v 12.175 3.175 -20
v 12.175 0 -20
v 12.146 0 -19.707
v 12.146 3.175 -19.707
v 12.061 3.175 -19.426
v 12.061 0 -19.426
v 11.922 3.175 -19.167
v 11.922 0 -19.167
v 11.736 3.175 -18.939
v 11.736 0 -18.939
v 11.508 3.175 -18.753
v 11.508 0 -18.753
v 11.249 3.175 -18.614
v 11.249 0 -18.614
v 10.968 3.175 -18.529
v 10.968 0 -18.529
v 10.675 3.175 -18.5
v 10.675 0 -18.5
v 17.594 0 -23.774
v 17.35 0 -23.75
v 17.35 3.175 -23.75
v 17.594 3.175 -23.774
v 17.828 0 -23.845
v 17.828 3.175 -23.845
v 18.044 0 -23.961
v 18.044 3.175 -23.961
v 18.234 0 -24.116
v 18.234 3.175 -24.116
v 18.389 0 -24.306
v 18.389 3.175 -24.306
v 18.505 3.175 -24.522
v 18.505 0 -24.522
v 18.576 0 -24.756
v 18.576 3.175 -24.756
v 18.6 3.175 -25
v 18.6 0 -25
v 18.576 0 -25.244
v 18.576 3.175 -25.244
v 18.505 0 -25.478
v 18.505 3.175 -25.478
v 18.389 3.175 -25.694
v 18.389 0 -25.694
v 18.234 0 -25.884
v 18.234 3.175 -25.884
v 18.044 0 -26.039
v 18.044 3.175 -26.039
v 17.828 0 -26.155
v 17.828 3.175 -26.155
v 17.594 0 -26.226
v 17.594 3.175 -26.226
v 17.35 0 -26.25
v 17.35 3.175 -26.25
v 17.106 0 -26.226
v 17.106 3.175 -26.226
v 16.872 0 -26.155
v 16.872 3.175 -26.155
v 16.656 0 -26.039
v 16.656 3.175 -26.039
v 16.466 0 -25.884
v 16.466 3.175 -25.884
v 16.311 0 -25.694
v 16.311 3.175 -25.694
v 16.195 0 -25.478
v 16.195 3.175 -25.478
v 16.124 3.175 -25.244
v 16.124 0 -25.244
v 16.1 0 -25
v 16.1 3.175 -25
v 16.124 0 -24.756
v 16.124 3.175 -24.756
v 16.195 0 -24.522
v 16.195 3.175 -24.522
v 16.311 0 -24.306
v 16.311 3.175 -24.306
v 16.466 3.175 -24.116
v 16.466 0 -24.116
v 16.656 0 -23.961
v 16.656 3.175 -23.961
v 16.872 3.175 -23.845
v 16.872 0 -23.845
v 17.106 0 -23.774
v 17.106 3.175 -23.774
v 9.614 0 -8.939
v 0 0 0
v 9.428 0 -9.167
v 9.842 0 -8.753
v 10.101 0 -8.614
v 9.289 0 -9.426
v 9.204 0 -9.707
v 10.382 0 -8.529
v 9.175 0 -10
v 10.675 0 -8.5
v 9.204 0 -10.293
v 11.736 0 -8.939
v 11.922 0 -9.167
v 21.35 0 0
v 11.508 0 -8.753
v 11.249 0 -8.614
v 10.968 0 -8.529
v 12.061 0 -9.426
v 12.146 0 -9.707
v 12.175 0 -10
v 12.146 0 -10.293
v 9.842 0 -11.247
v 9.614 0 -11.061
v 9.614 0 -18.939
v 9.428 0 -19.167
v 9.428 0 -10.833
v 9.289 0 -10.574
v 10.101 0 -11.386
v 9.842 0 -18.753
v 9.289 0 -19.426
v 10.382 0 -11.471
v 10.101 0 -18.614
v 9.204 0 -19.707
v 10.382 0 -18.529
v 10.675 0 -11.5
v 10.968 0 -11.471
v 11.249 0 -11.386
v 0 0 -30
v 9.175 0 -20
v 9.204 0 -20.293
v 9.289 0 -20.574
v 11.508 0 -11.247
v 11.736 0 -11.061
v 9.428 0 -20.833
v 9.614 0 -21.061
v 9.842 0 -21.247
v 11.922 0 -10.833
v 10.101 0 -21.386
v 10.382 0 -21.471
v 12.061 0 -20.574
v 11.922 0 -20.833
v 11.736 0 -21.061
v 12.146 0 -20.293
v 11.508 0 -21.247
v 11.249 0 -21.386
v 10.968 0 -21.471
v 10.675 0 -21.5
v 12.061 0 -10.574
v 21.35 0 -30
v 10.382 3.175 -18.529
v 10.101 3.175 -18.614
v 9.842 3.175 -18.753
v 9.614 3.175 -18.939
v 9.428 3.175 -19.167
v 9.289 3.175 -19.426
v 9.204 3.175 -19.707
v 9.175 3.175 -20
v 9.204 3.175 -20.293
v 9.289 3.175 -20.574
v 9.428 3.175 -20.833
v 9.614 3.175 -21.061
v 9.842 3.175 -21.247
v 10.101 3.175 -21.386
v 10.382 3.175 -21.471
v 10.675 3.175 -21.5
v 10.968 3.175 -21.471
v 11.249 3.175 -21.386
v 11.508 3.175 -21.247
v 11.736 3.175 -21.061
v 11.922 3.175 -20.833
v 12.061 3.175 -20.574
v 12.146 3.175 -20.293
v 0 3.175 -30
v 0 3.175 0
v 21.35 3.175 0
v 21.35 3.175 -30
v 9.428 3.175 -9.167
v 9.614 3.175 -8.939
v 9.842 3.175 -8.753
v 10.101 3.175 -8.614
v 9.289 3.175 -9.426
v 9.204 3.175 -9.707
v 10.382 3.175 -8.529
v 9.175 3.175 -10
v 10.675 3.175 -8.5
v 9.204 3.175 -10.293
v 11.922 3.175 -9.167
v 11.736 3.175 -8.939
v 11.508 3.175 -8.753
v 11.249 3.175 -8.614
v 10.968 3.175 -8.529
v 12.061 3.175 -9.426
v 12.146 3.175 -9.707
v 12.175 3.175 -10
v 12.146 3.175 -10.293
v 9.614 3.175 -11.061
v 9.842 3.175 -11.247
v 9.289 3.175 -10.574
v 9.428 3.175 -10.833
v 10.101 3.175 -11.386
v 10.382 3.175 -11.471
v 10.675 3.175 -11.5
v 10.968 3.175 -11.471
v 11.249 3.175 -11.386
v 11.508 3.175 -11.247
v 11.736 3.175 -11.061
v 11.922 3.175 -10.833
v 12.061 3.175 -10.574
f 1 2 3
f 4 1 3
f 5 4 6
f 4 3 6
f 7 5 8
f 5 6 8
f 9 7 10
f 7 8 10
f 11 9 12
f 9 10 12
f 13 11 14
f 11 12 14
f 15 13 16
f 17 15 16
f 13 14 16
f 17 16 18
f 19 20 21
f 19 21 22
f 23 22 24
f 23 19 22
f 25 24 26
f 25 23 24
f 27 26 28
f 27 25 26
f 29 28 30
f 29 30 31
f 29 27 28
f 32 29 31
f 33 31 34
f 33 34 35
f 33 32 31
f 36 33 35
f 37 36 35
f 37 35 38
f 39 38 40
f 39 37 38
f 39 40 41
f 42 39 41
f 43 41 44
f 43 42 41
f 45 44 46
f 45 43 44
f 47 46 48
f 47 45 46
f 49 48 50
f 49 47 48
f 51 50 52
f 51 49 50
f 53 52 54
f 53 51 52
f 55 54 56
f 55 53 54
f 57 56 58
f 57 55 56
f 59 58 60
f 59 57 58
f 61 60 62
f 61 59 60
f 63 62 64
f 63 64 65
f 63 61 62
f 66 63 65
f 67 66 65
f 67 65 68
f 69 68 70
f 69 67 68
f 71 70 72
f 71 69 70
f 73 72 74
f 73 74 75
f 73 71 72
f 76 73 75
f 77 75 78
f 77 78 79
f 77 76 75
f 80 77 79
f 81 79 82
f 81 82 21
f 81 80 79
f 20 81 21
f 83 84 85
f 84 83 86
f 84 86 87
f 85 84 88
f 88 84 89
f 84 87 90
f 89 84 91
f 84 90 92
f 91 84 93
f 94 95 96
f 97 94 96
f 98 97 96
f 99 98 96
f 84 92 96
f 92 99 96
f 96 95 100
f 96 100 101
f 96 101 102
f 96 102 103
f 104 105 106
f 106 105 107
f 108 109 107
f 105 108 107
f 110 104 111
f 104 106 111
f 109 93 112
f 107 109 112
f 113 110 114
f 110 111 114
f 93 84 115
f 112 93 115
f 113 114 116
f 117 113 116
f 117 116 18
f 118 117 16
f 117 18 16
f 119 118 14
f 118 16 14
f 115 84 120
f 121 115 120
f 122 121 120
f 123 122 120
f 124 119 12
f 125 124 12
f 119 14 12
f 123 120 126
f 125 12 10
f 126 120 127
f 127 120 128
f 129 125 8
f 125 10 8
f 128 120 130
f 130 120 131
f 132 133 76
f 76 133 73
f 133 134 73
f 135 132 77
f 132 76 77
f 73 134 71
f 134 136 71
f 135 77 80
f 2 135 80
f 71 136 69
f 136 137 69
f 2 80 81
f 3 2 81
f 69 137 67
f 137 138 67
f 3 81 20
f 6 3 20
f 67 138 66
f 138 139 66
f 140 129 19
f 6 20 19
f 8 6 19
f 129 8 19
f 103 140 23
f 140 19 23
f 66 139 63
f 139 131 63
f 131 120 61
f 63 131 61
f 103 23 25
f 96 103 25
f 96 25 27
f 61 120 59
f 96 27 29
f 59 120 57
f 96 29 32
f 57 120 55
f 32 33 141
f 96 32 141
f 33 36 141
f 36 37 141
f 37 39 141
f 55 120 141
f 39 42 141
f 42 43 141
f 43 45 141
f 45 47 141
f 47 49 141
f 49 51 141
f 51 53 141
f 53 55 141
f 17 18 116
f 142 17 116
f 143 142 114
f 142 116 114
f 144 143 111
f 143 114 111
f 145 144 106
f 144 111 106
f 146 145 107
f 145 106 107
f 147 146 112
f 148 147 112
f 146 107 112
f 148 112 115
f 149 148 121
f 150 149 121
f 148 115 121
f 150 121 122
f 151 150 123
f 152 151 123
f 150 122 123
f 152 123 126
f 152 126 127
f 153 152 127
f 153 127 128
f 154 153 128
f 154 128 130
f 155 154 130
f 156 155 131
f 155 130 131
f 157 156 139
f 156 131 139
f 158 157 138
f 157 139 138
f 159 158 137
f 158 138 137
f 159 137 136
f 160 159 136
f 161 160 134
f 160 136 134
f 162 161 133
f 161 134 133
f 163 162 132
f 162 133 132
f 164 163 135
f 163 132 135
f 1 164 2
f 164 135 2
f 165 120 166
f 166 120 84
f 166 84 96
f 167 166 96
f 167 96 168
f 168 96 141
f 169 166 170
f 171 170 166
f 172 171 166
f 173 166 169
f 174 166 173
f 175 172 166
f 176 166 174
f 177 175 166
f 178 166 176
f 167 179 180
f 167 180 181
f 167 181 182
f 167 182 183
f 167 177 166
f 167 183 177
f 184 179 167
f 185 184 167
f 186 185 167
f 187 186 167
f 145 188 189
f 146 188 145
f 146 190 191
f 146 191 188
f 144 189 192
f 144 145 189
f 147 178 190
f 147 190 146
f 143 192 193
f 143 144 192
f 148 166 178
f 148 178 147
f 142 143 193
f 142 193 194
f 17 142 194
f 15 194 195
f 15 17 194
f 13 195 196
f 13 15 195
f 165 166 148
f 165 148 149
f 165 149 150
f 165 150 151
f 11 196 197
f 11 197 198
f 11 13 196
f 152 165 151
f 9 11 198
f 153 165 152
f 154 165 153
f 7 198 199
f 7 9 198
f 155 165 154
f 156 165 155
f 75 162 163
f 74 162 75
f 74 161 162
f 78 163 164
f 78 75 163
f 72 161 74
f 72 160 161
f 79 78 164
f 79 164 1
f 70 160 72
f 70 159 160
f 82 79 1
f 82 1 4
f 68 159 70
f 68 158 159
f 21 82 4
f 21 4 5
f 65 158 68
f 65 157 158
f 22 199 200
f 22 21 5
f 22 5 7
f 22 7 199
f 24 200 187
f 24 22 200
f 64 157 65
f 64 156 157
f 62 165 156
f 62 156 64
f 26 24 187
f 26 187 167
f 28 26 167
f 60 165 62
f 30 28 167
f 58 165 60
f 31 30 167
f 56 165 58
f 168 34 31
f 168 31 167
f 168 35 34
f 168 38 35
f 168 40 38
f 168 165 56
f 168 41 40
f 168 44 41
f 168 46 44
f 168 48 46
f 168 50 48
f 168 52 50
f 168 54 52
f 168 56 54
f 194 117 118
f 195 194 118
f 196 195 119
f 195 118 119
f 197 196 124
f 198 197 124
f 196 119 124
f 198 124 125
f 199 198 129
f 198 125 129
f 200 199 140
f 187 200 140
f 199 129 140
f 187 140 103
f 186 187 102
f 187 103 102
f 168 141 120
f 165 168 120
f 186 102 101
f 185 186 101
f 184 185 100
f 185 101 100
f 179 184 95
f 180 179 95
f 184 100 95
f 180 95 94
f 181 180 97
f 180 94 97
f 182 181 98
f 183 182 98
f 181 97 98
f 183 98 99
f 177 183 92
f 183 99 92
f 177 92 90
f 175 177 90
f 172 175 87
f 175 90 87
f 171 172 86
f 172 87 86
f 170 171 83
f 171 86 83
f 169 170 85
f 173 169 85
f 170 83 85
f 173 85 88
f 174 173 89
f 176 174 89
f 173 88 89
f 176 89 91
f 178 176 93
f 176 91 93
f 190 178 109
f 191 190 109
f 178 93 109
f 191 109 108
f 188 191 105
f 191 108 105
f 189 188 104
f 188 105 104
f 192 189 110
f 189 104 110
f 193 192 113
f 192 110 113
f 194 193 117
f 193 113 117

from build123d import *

# Parameters (mm, degrees)
SKETCH1_R           = 1.25
BOSS_EXTRUDE1_DEPTH = 3.175


with BuildPart() as part:
    # Sketch1 → Boss-Extrude1 (new body)
    with BuildSketch(Plane(origin=(0, 0, 0), x_dir=(1, 0, 0), z_dir=(0, 1, 0))):
        Polygon((0, 0), (10.675, 0), (21.35, 0), (21.35, 20), (21.35, 30), (0, 30), align=None)
        with BuildLine():
            ThreePointArc((12.175, 10), (11.735660172, 8.939339828), (10.675, 8.5))
            ThreePointArc((10.675, 8.5), (9.175, 10), (10.675, 11.5))
            ThreePointArc((10.675, 11.5), (11.735660172, 11.060660172), (12.175, 10))
        make_face(mode=Mode.SUBTRACT)
        with BuildLine():
            ThreePointArc((12.175, 20), (11.735660172, 18.939339828), (10.675, 18.5))
            ThreePointArc((10.675, 18.5), (9.614339828, 21.060660172), (12.175, 20))
        make_face(mode=Mode.SUBTRACT)
        with Locations((17.35, 25)):
            Circle(SKETCH1_R, mode=Mode.SUBTRACT)
    extrude(amount=BOSS_EXTRUDE1_DEPTH)


solid = part.part
